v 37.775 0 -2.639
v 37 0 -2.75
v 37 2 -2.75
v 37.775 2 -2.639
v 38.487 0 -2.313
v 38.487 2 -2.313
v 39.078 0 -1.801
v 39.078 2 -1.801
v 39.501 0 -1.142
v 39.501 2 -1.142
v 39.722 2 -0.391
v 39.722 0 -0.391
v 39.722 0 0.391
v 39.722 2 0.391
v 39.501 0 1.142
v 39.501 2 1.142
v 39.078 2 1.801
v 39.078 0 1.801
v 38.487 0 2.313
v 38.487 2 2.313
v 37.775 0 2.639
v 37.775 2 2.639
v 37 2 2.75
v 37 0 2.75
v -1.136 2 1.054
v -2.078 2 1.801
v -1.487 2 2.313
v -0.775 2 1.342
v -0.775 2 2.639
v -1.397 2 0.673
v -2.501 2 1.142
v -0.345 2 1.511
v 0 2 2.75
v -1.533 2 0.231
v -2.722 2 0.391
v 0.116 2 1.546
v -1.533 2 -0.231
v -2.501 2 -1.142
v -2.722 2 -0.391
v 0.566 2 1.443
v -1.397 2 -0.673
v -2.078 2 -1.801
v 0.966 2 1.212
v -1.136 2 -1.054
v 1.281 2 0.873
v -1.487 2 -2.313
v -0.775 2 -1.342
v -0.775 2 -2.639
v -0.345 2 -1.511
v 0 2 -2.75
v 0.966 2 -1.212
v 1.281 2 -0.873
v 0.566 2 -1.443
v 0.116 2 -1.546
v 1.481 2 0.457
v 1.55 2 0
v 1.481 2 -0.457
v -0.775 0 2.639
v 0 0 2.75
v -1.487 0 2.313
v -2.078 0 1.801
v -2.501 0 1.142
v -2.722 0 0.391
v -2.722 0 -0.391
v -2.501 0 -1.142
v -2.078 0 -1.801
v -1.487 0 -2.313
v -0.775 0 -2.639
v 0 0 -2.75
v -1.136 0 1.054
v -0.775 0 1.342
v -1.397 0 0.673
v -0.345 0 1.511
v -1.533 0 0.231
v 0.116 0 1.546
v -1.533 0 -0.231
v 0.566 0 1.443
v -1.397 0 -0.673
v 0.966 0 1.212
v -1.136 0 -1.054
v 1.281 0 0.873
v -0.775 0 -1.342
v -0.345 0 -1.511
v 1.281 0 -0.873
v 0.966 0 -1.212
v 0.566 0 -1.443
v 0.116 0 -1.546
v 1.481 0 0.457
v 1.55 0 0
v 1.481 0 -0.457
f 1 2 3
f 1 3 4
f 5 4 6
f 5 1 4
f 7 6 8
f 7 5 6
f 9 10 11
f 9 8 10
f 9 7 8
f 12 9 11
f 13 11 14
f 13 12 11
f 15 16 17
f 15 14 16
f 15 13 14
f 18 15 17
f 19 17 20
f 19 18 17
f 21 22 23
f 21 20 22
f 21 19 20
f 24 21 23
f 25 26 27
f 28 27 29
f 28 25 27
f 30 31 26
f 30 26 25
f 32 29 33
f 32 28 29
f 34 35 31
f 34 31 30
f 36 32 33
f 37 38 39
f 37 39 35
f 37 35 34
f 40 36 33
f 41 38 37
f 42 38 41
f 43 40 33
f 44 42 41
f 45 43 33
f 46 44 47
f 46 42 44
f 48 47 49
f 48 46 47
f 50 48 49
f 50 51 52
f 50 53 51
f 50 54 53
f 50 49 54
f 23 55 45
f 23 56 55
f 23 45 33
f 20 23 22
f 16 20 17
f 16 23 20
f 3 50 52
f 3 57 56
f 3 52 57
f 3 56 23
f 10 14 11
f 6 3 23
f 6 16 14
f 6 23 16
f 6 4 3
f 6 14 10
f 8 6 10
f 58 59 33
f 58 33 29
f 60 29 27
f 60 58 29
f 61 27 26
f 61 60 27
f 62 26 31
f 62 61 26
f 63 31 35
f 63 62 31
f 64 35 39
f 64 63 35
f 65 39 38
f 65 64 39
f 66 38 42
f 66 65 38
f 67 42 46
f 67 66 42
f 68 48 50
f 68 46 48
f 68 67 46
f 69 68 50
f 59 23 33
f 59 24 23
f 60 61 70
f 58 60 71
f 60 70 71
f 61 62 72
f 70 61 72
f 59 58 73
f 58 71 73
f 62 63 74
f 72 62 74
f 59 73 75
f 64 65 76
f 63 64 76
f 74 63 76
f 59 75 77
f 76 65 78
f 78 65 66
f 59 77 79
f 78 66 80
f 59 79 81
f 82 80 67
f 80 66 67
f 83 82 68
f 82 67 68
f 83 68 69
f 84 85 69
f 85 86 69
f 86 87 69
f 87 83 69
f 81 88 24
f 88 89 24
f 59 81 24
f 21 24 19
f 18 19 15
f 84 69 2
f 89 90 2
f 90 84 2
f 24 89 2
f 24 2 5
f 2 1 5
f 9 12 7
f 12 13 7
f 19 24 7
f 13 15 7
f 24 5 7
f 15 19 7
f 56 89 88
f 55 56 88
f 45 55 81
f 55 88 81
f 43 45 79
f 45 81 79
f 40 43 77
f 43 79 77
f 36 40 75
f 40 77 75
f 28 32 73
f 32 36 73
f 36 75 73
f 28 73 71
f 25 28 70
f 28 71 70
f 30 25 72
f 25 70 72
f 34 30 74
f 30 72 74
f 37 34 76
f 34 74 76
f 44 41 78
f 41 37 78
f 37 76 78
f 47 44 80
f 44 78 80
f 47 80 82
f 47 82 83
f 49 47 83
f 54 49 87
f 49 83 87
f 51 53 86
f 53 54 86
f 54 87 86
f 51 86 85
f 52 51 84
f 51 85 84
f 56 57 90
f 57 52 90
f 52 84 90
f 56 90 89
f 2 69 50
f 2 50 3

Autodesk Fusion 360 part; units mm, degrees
sketch "Sketch1" plane through (0, 0, 0) normal (0, 1, 0) x (1, 0, 0)
  circle A0 centre (0, 0) radius 1.55
  circle A1 centre (0, 0) radius 2.75
  line L0 (0, 2.75) -> (37, 2.75)
  line L1 (29.0028, 0) -> (29.0028, 0)
  line L2 (37, -2.75) -> (0, -2.75)
  arc A2 (39.75, 0) -> (37, 2.75) centre (37, 0) ccw
  arc A3 (37, -2.75) -> (39.75, 0) centre (37, 0) ccw
  dimension "d1" = 3.1
  dimension "d3" = 5.5
  dimension "d4" = 2.75
  dimension "d6" = 37
extrude "Extrude1" add sketch "Sketch1" along normal blind 2
equation "d6 = 40 mm - d4 - 0.25 mm"
